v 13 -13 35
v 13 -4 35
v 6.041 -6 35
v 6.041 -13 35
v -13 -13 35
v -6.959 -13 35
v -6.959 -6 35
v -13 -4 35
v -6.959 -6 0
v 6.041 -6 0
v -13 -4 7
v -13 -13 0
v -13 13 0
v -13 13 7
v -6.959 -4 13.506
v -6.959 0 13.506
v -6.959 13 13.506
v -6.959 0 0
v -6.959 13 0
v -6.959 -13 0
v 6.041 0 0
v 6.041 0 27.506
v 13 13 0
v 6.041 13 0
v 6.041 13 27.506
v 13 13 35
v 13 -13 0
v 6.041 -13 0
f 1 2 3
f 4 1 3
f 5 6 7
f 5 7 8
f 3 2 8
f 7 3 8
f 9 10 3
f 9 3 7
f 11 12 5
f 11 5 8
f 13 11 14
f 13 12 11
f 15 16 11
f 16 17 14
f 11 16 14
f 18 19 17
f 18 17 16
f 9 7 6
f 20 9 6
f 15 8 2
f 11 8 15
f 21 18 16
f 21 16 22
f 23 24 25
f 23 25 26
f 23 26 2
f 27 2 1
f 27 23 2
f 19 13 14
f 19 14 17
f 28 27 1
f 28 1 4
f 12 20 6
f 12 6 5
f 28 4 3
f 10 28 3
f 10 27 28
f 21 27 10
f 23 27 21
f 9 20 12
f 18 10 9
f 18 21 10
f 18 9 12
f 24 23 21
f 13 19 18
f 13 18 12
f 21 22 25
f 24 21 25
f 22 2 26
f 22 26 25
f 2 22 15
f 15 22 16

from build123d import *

# Parameters (mm, degrees)
EXTRUDE_1_DEPTH     = 35
CUT_EXTRUDE_1_DEPTH = 17


with BuildPart() as part:
    # 草圖1 → 填料-伸長1 (new body)
    with BuildSketch(Plane.XY):
        Polygon((-6.958874233, 13), (-6.958874233, 0), (6.041125767, 0), (6.041125767, 13), (13, 13), (13, -13), (6.041125767, -13), (6.041125767, -6), (-6.958874233, -6), (-6.958874233, -13), (-13, -13), (-13, 13), align=None)
    extrude(amount=EXTRUDE_1_DEPTH)

    # 草圖2 → 除料-伸長1 (cut)
    with BuildSketch(Plane(origin=(0, 13, 0), x_dir=(1, 0, 0), z_dir=(0, 1, 0))):
        Polygon((13, -35), (-6.958874233, -13.50582775), (-6.958874233, -35), align=None)
        Polygon((-6.958874233, -13.50582775), (-13, -7), (-13, -35), (-6.958874233, -35), align=None)
    extrude(amount=-CUT_EXTRUDE_1_DEPTH, mode=Mode.SUBTRACT)


solid = part.part
